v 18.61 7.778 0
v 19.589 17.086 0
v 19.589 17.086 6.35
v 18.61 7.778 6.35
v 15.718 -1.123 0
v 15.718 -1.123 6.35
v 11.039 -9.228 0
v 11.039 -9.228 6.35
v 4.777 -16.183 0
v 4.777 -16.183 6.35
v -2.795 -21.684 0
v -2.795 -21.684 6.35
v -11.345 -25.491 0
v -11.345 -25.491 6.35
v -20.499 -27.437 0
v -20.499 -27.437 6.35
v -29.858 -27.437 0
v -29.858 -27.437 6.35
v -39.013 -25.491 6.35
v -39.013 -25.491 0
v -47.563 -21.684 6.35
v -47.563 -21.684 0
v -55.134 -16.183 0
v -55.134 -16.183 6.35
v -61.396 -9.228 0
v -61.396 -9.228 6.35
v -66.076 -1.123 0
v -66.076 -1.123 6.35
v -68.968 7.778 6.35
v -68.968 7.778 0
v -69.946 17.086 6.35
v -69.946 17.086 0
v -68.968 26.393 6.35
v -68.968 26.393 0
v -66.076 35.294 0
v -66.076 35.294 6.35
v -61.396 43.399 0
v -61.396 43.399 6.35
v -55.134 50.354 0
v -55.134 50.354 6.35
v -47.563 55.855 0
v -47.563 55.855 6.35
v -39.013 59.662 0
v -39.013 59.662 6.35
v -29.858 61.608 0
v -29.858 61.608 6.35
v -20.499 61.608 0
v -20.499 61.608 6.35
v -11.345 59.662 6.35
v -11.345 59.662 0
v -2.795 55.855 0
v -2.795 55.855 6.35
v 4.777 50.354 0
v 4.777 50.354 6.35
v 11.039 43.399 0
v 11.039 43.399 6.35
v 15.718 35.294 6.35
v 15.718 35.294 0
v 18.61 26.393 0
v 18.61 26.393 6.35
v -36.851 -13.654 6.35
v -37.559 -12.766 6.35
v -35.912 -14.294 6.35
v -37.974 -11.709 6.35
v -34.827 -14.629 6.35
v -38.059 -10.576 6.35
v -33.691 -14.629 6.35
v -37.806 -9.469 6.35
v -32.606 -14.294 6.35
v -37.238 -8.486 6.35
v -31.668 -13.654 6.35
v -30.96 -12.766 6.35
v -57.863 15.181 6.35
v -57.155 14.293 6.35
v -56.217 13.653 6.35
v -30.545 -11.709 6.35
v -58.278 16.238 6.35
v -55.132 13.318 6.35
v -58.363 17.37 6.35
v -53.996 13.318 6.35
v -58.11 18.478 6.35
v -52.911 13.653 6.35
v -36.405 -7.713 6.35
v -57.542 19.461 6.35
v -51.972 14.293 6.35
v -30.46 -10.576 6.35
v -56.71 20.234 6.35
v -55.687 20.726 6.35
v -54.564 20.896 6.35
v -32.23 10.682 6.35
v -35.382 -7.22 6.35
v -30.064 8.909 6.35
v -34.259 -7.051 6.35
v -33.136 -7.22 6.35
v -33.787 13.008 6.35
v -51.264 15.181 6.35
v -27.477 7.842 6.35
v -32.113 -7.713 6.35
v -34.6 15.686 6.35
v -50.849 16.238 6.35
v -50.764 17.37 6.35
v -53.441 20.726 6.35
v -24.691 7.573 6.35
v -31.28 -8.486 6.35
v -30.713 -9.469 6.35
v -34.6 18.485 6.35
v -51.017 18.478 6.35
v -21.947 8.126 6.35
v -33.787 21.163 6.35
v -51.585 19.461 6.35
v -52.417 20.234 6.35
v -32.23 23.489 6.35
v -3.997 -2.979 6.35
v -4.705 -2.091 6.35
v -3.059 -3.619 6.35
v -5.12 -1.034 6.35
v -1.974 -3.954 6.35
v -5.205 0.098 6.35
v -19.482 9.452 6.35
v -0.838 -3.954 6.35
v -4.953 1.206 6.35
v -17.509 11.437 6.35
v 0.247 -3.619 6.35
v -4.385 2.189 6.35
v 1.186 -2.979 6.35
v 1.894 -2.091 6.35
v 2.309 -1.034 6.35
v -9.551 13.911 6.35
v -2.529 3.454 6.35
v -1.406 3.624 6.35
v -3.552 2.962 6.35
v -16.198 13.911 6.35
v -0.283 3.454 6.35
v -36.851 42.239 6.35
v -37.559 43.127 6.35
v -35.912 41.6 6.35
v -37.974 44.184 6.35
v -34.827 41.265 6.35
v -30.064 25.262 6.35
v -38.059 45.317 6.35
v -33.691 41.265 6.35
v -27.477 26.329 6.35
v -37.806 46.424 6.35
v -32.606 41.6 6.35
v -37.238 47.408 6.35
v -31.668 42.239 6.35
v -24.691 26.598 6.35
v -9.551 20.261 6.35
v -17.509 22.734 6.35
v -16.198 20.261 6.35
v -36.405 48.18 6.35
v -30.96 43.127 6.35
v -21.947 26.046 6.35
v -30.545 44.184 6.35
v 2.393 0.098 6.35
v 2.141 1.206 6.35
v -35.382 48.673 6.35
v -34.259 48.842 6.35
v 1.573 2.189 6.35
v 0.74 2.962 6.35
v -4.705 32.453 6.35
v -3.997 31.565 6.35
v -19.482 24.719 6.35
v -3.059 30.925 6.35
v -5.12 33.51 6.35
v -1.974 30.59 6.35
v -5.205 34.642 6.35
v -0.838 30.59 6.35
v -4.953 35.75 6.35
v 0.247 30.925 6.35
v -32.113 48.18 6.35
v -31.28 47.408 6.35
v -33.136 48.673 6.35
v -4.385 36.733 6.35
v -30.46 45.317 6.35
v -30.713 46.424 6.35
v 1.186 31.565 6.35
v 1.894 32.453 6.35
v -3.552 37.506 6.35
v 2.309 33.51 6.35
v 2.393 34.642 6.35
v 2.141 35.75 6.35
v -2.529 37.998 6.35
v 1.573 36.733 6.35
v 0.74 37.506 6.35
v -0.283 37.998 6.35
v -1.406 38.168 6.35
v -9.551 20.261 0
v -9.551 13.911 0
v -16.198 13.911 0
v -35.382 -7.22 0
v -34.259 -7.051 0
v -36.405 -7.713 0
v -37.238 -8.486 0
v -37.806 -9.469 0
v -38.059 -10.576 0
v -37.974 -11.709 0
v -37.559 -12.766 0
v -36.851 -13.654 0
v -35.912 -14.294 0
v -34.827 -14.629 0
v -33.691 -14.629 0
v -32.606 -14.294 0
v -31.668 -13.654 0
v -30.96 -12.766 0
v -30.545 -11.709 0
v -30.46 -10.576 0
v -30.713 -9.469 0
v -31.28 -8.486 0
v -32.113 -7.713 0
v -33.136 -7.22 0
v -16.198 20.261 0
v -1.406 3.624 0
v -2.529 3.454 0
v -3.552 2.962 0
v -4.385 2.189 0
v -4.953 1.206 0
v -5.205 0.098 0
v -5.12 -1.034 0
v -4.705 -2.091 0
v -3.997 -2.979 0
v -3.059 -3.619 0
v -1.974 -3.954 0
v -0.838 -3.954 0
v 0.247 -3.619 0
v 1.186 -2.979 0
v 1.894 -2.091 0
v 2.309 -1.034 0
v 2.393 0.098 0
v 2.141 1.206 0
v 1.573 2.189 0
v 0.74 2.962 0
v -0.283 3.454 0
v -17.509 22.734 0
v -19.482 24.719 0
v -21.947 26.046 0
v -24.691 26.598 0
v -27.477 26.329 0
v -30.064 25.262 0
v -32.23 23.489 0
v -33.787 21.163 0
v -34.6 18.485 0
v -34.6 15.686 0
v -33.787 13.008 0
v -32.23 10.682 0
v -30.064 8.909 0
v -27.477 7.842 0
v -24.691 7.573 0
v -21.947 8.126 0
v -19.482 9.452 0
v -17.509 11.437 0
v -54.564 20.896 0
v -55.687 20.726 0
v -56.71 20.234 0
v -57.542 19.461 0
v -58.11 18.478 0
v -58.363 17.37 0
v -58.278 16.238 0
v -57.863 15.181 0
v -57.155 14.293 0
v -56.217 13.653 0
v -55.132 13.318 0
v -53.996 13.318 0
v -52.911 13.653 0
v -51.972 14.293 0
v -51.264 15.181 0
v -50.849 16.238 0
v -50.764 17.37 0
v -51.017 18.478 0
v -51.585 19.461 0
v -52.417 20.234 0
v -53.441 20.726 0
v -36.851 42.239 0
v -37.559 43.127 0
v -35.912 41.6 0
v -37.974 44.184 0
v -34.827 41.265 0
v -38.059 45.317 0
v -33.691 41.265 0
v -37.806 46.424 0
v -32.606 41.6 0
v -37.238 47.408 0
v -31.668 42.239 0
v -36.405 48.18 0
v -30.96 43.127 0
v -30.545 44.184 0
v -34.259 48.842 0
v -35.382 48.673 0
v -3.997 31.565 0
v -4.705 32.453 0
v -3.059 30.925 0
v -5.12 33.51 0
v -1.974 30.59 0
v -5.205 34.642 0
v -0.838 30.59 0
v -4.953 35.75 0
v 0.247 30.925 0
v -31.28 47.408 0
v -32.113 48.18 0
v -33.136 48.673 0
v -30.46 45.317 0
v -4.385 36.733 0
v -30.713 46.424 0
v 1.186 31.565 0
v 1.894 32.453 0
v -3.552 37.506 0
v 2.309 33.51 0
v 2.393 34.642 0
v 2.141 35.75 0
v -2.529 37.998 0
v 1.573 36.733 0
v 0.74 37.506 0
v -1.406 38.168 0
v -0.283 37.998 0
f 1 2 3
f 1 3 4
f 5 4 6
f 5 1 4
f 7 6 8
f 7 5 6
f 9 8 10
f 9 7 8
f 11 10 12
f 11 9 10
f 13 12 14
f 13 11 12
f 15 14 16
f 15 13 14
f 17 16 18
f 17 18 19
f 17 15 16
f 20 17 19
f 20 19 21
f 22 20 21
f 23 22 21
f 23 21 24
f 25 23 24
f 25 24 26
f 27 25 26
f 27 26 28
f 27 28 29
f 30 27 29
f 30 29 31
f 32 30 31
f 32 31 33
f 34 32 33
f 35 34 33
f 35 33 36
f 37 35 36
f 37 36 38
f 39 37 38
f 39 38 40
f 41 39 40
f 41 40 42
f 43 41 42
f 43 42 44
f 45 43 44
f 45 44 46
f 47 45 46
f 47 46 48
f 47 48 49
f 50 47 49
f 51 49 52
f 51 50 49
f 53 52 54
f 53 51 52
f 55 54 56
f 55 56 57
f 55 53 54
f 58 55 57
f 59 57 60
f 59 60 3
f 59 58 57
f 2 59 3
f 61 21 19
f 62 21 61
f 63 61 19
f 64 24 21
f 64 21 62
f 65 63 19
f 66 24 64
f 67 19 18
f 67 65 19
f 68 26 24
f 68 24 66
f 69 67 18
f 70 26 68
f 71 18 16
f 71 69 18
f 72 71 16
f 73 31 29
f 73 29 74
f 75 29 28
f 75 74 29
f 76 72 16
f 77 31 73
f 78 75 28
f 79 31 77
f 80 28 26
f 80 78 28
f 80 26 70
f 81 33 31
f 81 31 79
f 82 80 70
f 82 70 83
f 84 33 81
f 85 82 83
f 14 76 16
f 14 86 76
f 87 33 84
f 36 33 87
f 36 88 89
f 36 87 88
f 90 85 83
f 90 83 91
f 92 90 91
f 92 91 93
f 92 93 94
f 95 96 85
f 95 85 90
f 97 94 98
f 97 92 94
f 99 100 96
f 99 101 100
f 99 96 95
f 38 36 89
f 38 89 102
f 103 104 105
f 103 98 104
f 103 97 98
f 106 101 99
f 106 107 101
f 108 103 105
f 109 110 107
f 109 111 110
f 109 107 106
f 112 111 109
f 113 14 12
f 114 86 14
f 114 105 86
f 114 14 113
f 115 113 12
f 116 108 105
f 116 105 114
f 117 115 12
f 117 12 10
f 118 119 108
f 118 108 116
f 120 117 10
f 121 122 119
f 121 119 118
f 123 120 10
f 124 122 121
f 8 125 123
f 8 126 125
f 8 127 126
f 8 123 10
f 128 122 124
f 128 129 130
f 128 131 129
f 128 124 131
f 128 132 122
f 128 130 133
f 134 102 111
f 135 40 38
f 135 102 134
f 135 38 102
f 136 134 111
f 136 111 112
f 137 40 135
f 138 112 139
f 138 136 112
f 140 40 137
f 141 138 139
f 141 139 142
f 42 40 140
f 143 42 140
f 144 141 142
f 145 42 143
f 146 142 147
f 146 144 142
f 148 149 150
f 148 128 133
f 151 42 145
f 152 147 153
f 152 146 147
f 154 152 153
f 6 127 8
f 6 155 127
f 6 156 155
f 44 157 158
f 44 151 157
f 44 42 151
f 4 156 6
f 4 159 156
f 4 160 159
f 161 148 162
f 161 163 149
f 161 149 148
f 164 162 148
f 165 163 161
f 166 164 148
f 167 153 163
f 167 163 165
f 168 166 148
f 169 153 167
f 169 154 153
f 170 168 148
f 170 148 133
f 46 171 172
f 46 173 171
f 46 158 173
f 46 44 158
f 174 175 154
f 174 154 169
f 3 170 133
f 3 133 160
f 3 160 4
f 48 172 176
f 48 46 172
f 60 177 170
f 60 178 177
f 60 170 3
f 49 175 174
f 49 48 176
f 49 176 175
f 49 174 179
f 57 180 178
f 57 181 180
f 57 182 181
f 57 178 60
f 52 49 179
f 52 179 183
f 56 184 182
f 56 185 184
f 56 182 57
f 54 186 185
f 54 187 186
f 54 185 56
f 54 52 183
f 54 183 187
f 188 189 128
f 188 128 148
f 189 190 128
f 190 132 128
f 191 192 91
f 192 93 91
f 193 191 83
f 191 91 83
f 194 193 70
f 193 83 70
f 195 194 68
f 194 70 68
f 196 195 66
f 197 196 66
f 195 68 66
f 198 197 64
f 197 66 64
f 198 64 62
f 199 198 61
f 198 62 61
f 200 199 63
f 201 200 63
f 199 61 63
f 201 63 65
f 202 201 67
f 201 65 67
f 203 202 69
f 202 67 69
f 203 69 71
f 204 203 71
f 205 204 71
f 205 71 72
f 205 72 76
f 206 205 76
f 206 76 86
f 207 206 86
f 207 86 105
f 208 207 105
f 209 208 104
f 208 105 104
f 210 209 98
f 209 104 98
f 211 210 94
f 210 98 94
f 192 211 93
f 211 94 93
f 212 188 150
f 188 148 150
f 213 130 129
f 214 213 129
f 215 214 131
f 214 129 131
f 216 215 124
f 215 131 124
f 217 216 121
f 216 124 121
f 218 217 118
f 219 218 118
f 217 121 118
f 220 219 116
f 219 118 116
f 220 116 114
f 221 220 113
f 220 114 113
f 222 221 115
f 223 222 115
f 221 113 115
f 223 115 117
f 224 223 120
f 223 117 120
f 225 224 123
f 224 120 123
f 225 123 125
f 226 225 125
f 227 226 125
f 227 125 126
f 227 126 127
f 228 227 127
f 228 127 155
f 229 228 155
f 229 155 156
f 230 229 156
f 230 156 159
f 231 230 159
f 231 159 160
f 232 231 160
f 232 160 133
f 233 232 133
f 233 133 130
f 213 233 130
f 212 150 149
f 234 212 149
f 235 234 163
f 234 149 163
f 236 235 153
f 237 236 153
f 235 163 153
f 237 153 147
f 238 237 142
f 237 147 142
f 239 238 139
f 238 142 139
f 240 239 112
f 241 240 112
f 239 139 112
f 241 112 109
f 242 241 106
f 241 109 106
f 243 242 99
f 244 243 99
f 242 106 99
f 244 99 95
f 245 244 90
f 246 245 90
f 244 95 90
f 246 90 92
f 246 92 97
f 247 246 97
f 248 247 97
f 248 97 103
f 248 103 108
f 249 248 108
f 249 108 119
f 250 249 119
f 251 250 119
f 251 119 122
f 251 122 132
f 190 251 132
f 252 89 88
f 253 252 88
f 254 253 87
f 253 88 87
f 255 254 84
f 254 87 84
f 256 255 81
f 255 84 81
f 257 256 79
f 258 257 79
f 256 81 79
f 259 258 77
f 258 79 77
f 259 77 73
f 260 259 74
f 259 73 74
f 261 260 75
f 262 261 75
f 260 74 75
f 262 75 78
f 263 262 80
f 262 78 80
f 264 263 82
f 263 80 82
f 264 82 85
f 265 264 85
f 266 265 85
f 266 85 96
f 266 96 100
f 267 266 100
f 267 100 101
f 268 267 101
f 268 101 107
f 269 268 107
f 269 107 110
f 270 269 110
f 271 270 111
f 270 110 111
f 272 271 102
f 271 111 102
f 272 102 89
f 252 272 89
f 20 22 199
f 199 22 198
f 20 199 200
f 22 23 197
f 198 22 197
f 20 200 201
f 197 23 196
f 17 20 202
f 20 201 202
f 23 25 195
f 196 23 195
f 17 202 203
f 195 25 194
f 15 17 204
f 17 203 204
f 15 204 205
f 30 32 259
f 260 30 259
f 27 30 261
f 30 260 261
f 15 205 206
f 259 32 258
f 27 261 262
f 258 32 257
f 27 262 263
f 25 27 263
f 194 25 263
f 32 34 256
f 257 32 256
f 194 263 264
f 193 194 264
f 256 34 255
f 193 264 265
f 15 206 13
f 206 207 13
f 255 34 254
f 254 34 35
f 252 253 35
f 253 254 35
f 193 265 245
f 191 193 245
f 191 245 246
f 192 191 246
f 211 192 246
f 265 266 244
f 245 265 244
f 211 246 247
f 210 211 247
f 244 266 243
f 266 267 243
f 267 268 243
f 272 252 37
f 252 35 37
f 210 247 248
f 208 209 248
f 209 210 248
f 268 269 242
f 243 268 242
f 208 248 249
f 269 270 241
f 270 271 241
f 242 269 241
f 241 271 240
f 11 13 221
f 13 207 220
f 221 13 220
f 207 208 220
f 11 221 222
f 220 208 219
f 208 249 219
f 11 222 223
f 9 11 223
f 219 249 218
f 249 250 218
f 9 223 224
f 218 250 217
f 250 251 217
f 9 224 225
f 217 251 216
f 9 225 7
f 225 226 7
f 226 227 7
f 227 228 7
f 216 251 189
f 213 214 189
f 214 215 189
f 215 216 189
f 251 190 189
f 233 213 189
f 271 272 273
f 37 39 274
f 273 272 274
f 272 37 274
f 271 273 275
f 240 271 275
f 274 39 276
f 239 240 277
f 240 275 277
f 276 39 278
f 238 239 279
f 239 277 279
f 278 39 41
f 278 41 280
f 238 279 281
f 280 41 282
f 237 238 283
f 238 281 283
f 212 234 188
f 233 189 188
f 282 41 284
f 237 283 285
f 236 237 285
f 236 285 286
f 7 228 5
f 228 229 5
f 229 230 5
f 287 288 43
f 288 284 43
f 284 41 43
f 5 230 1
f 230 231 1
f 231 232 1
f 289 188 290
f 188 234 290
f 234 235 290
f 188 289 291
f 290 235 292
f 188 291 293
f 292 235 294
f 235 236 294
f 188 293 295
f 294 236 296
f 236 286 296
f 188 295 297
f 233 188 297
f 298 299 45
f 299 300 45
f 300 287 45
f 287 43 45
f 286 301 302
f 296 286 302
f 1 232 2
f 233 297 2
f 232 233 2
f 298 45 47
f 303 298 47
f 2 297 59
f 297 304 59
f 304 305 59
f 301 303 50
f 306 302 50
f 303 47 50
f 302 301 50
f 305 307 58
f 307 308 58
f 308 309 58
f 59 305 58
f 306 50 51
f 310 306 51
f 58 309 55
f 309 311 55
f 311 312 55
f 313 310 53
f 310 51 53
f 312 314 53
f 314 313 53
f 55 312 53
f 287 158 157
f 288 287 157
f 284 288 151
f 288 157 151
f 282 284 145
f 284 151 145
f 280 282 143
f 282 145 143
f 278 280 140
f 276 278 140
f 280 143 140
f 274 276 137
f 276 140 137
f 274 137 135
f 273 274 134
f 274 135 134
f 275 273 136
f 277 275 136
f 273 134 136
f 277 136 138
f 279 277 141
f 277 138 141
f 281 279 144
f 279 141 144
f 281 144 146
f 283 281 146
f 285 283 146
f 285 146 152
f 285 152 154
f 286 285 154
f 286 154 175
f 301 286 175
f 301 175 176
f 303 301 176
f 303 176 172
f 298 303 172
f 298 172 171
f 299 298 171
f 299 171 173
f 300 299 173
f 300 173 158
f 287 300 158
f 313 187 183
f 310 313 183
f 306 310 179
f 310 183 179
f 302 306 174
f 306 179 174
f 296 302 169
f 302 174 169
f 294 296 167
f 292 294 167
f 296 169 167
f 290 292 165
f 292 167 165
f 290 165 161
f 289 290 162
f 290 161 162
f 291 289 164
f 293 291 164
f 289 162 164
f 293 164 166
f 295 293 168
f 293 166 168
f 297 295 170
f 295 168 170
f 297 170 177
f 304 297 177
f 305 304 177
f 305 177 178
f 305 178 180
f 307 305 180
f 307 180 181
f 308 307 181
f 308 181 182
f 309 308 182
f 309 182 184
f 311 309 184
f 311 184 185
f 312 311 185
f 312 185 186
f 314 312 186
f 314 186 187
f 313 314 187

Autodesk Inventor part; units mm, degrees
ref_plane "YZ Plane" through (0, 0, 0) normal (1, 0, 0) x (0, 1, 0)
ref_plane "XZ Plane" through (0, 0, 0) normal (0, 1, 0) x (-1, 0, 0)
ref_plane "XY Plane" through (0, 0, 0) normal (0, 0, 1) x (1, 0, 0)
sketch "Sketch1" plane through (0, 0, 0) normal (0, 0, 1) x (1, 0, 0)
  line L0 (-25.1788, 61.8531) -> (-25.1788, 68.2031)
  line L1 (-13.5921, 60.3277) -> (-11.9486, 66.4613)
  line L2 (-2.7951, 55.8554) -> (0.3799, 61.3547)
  line L3 (6.4766, 48.741) -> (10.9667, 53.2312)
  line L4 (13.591, 39.4694) -> (19.0902, 42.6444)
  line L5 (18.0633, 28.6723) -> (24.1969, 30.3158)
  line L6 (19.5887, 17.0856) -> (25.9387, 17.0856)
  line L7 (18.0633, 5.4989) -> (24.1969, 3.8554)
  line L8 (13.591, -5.2981) -> (19.0902, -8.4731)
  line L9 (6.4766, -14.5698) -> (10.9667, -19.0599)
  line L10 (-2.7951, -21.6842) -> (0.3799, -27.1834)
  line L11 (-13.5921, -26.1565) -> (-11.9486, -32.2901)
  line L12 (-25.1788, -27.6819) -> (-25.1788, -34.0319)
  line L13 (-36.7655, -26.1565) -> (-38.409, -32.2901)
  line L14 (-47.5626, -21.6842) -> (-50.7376, -27.1834)
  line L15 (-56.8342, -14.5698) -> (-61.3243, -19.0599)
  line L16 (-63.9486, -5.2981) -> (-69.4479, -8.4731)
  line L17 (-68.4209, 5.4989) -> (-74.5545, 3.8554)
  line L18 (-69.9463, 17.0856) -> (-76.2963, 17.0856)
  line L19 (-68.4209, 28.6723) -> (-74.5545, 30.3158)
  line L20 (-63.9486, 39.4694) -> (-69.4479, 42.6444)
  line L21 (-56.8342, 48.741) -> (-61.3243, 53.2312)
  line L22 (-47.5626, 55.8554) -> (-50.7376, 61.3547)
  line L23 (-36.7655, 60.3277) -> (-38.409, 66.4613)
  arc A0 (-38.409, 66.4613) -> (-25.1788, 68.2031) centre (-31.8994, 68.1336) ccw
  arc A1 (-25.1788, 68.2031) -> (-11.9486, 66.4613) centre (-18.4582, 68.1336) ccw
  arc A2 (-11.9486, 66.4613) -> (0.3799, 61.3547) centre (-5.475, 64.6547) ccw
  arc A3 (0.3799, 61.3547) -> (10.9667, 53.2312) centre (6.1654, 57.9342) ccw
  arc A4 (10.9667, 53.2312) -> (19.0902, 42.6444) centre (15.6697, 48.4298) ccw
  arc A5 (19.0902, 42.6444) -> (24.1969, 30.3158) centre (22.3903, 36.7894) ccw
  arc A6 (24.1969, 30.3158) -> (25.9387, 17.0856) centre (25.8692, 23.8062) ccw
  arc A7 (25.9387, 17.0856) -> (24.1969, 3.8554) centre (25.8692, 10.365) ccw
  arc A8 (24.1969, 3.8554) -> (19.0902, -8.4731) centre (22.3903, -2.6182) ccw
  arc A9 (19.0902, -8.4731) -> (10.9667, -19.0599) centre (15.6697, -14.2586) ccw
  arc A10 (10.9667, -19.0599) -> (0.3799, -27.1834) centre (6.1654, -23.7629) ccw
  arc A11 (0.3799, -27.1834) -> (-11.9486, -32.2901) centre (-5.475, -30.4835) ccw
  arc A12 (-11.9486, -32.2901) -> (-25.1788, -34.0319) centre (-18.4582, -33.9623) ccw
  arc A13 (-25.1788, -34.0319) -> (-38.409, -32.2901) centre (-31.8994, -33.9623) ccw
  arc A14 (-38.409, -32.2901) -> (-50.7376, -27.1834) centre (-44.8826, -30.4835) ccw
  arc A15 (-50.7376, -27.1834) -> (-61.3243, -19.0599) centre (-56.523, -23.7629) ccw
  arc A16 (-61.3243, -19.0599) -> (-69.4479, -8.4731) centre (-66.0273, -14.2586) ccw
  arc A17 (-69.4479, -8.4731) -> (-74.5545, 3.8554) centre (-72.7479, -2.6182) ccw
  arc A18 (-74.5545, 3.8554) -> (-76.2963, 17.0856) centre (-76.2268, 10.365) ccw
  arc A19 (-76.2963, 17.0856) -> (-74.5545, 30.3158) centre (-76.2268, 23.8062) ccw
  arc A20 (-74.5545, 30.3158) -> (-69.4479, 42.6444) centre (-72.7479, 36.7894) ccw
  arc A21 (-69.4479, 42.6444) -> (-61.3243, 53.2312) centre (-66.0273, 48.4298) ccw
  arc A22 (-61.3243, 53.2312) -> (-50.7376, 61.3547) centre (-56.523, 57.9342) ccw
  arc A23 (-50.7376, 61.3547) -> (-38.409, 66.4613) centre (-44.8826, 64.6547) ccw
  circle A24 centre (-25.1788, 17.0856) radius 44.7675
  point P0 (0, 0)
  dimension "d36" = 89.535
  dimension "d8" = 360
extrude "Extrusion1" add sketch "Sketch1" along normal blind 6.35 contours A24
sketch "Sketch2" plane through (-25.1788, 17.0856, 0) normal (0, 0, -1) x (-1, 0, 0)
  circle A0 centre (-23.7729, 17.272) radius 3.81
  circle A1 centre (0, 0) radius 44.7675 projected
  circle A2 centre (9.0804, 27.9467) radius 3.81
  circle A3 centre (29.3849, 0) radius 3.81
  circle A4 centre (9.0804, -27.9467) radius 3.81
  circle A5 centre (-23.7729, -17.272) radius 3.81
  point P0 (-25.1788, -17.0856)
  dimension "d15" = 360
  dimension "d17" = 17.272
  dimension "d19" = 0
  dimension "d20" = 7.62
hole "Hole1" at (-1.4059, 34.3576, 0) at (-1.4059, -0.1864, 0) at (-34.2592, 45.0323, 0) at (-34.2592, -10.8611, 0) at (-54.5637, 17.0856, 0) direction (0, 0, 1) diameter 7.62 end through all
sketch "Sketch3" plane through (-25.1788, 17.0856, 0) normal (0, 0, -1) x (-1, 0, 0)
  point P0 (-25.1788, -17.0856)
sketch "Sketch4" plane through (-25.1788, 17.0856, 0) normal (0, 0, -1) x (-1, 0, 0)
  point P0 (-25.1788, -17.0856)
sketch "Sketch5" plane through (-25.1788, 17.0856, 6.35) normal (0, 0, 1) x (1, 0, 0)
  arc A0 (8.9803, 3.175) -> (8.9803, -3.175) centre (0, 0) ccw
  line L0 (15.6281, 3.175) -> (8.9803, 3.175)
  line L1 (8.9803, -3.175) -> (15.6281, -3.175)
  line L2 (15.6281, -3.175) -> (15.6281, 3.175)
  circle A1 centre (0, 0) radius 44.7675 projected
  point P0 (25.1788, -17.0856)
  dimension "d28" = 19.05
  dimension "d40" = 0
  dimension "d41" = 6.35
  dimension "d42" = 3.175
  dimension "d43" = 0
  dimension "d46" = 15.6281
extrude "Extrusion2" cut sketch "Sketch5" against normal through all contours L0 L2 L1 A0
properties part number "Seeder Motor Gear"
